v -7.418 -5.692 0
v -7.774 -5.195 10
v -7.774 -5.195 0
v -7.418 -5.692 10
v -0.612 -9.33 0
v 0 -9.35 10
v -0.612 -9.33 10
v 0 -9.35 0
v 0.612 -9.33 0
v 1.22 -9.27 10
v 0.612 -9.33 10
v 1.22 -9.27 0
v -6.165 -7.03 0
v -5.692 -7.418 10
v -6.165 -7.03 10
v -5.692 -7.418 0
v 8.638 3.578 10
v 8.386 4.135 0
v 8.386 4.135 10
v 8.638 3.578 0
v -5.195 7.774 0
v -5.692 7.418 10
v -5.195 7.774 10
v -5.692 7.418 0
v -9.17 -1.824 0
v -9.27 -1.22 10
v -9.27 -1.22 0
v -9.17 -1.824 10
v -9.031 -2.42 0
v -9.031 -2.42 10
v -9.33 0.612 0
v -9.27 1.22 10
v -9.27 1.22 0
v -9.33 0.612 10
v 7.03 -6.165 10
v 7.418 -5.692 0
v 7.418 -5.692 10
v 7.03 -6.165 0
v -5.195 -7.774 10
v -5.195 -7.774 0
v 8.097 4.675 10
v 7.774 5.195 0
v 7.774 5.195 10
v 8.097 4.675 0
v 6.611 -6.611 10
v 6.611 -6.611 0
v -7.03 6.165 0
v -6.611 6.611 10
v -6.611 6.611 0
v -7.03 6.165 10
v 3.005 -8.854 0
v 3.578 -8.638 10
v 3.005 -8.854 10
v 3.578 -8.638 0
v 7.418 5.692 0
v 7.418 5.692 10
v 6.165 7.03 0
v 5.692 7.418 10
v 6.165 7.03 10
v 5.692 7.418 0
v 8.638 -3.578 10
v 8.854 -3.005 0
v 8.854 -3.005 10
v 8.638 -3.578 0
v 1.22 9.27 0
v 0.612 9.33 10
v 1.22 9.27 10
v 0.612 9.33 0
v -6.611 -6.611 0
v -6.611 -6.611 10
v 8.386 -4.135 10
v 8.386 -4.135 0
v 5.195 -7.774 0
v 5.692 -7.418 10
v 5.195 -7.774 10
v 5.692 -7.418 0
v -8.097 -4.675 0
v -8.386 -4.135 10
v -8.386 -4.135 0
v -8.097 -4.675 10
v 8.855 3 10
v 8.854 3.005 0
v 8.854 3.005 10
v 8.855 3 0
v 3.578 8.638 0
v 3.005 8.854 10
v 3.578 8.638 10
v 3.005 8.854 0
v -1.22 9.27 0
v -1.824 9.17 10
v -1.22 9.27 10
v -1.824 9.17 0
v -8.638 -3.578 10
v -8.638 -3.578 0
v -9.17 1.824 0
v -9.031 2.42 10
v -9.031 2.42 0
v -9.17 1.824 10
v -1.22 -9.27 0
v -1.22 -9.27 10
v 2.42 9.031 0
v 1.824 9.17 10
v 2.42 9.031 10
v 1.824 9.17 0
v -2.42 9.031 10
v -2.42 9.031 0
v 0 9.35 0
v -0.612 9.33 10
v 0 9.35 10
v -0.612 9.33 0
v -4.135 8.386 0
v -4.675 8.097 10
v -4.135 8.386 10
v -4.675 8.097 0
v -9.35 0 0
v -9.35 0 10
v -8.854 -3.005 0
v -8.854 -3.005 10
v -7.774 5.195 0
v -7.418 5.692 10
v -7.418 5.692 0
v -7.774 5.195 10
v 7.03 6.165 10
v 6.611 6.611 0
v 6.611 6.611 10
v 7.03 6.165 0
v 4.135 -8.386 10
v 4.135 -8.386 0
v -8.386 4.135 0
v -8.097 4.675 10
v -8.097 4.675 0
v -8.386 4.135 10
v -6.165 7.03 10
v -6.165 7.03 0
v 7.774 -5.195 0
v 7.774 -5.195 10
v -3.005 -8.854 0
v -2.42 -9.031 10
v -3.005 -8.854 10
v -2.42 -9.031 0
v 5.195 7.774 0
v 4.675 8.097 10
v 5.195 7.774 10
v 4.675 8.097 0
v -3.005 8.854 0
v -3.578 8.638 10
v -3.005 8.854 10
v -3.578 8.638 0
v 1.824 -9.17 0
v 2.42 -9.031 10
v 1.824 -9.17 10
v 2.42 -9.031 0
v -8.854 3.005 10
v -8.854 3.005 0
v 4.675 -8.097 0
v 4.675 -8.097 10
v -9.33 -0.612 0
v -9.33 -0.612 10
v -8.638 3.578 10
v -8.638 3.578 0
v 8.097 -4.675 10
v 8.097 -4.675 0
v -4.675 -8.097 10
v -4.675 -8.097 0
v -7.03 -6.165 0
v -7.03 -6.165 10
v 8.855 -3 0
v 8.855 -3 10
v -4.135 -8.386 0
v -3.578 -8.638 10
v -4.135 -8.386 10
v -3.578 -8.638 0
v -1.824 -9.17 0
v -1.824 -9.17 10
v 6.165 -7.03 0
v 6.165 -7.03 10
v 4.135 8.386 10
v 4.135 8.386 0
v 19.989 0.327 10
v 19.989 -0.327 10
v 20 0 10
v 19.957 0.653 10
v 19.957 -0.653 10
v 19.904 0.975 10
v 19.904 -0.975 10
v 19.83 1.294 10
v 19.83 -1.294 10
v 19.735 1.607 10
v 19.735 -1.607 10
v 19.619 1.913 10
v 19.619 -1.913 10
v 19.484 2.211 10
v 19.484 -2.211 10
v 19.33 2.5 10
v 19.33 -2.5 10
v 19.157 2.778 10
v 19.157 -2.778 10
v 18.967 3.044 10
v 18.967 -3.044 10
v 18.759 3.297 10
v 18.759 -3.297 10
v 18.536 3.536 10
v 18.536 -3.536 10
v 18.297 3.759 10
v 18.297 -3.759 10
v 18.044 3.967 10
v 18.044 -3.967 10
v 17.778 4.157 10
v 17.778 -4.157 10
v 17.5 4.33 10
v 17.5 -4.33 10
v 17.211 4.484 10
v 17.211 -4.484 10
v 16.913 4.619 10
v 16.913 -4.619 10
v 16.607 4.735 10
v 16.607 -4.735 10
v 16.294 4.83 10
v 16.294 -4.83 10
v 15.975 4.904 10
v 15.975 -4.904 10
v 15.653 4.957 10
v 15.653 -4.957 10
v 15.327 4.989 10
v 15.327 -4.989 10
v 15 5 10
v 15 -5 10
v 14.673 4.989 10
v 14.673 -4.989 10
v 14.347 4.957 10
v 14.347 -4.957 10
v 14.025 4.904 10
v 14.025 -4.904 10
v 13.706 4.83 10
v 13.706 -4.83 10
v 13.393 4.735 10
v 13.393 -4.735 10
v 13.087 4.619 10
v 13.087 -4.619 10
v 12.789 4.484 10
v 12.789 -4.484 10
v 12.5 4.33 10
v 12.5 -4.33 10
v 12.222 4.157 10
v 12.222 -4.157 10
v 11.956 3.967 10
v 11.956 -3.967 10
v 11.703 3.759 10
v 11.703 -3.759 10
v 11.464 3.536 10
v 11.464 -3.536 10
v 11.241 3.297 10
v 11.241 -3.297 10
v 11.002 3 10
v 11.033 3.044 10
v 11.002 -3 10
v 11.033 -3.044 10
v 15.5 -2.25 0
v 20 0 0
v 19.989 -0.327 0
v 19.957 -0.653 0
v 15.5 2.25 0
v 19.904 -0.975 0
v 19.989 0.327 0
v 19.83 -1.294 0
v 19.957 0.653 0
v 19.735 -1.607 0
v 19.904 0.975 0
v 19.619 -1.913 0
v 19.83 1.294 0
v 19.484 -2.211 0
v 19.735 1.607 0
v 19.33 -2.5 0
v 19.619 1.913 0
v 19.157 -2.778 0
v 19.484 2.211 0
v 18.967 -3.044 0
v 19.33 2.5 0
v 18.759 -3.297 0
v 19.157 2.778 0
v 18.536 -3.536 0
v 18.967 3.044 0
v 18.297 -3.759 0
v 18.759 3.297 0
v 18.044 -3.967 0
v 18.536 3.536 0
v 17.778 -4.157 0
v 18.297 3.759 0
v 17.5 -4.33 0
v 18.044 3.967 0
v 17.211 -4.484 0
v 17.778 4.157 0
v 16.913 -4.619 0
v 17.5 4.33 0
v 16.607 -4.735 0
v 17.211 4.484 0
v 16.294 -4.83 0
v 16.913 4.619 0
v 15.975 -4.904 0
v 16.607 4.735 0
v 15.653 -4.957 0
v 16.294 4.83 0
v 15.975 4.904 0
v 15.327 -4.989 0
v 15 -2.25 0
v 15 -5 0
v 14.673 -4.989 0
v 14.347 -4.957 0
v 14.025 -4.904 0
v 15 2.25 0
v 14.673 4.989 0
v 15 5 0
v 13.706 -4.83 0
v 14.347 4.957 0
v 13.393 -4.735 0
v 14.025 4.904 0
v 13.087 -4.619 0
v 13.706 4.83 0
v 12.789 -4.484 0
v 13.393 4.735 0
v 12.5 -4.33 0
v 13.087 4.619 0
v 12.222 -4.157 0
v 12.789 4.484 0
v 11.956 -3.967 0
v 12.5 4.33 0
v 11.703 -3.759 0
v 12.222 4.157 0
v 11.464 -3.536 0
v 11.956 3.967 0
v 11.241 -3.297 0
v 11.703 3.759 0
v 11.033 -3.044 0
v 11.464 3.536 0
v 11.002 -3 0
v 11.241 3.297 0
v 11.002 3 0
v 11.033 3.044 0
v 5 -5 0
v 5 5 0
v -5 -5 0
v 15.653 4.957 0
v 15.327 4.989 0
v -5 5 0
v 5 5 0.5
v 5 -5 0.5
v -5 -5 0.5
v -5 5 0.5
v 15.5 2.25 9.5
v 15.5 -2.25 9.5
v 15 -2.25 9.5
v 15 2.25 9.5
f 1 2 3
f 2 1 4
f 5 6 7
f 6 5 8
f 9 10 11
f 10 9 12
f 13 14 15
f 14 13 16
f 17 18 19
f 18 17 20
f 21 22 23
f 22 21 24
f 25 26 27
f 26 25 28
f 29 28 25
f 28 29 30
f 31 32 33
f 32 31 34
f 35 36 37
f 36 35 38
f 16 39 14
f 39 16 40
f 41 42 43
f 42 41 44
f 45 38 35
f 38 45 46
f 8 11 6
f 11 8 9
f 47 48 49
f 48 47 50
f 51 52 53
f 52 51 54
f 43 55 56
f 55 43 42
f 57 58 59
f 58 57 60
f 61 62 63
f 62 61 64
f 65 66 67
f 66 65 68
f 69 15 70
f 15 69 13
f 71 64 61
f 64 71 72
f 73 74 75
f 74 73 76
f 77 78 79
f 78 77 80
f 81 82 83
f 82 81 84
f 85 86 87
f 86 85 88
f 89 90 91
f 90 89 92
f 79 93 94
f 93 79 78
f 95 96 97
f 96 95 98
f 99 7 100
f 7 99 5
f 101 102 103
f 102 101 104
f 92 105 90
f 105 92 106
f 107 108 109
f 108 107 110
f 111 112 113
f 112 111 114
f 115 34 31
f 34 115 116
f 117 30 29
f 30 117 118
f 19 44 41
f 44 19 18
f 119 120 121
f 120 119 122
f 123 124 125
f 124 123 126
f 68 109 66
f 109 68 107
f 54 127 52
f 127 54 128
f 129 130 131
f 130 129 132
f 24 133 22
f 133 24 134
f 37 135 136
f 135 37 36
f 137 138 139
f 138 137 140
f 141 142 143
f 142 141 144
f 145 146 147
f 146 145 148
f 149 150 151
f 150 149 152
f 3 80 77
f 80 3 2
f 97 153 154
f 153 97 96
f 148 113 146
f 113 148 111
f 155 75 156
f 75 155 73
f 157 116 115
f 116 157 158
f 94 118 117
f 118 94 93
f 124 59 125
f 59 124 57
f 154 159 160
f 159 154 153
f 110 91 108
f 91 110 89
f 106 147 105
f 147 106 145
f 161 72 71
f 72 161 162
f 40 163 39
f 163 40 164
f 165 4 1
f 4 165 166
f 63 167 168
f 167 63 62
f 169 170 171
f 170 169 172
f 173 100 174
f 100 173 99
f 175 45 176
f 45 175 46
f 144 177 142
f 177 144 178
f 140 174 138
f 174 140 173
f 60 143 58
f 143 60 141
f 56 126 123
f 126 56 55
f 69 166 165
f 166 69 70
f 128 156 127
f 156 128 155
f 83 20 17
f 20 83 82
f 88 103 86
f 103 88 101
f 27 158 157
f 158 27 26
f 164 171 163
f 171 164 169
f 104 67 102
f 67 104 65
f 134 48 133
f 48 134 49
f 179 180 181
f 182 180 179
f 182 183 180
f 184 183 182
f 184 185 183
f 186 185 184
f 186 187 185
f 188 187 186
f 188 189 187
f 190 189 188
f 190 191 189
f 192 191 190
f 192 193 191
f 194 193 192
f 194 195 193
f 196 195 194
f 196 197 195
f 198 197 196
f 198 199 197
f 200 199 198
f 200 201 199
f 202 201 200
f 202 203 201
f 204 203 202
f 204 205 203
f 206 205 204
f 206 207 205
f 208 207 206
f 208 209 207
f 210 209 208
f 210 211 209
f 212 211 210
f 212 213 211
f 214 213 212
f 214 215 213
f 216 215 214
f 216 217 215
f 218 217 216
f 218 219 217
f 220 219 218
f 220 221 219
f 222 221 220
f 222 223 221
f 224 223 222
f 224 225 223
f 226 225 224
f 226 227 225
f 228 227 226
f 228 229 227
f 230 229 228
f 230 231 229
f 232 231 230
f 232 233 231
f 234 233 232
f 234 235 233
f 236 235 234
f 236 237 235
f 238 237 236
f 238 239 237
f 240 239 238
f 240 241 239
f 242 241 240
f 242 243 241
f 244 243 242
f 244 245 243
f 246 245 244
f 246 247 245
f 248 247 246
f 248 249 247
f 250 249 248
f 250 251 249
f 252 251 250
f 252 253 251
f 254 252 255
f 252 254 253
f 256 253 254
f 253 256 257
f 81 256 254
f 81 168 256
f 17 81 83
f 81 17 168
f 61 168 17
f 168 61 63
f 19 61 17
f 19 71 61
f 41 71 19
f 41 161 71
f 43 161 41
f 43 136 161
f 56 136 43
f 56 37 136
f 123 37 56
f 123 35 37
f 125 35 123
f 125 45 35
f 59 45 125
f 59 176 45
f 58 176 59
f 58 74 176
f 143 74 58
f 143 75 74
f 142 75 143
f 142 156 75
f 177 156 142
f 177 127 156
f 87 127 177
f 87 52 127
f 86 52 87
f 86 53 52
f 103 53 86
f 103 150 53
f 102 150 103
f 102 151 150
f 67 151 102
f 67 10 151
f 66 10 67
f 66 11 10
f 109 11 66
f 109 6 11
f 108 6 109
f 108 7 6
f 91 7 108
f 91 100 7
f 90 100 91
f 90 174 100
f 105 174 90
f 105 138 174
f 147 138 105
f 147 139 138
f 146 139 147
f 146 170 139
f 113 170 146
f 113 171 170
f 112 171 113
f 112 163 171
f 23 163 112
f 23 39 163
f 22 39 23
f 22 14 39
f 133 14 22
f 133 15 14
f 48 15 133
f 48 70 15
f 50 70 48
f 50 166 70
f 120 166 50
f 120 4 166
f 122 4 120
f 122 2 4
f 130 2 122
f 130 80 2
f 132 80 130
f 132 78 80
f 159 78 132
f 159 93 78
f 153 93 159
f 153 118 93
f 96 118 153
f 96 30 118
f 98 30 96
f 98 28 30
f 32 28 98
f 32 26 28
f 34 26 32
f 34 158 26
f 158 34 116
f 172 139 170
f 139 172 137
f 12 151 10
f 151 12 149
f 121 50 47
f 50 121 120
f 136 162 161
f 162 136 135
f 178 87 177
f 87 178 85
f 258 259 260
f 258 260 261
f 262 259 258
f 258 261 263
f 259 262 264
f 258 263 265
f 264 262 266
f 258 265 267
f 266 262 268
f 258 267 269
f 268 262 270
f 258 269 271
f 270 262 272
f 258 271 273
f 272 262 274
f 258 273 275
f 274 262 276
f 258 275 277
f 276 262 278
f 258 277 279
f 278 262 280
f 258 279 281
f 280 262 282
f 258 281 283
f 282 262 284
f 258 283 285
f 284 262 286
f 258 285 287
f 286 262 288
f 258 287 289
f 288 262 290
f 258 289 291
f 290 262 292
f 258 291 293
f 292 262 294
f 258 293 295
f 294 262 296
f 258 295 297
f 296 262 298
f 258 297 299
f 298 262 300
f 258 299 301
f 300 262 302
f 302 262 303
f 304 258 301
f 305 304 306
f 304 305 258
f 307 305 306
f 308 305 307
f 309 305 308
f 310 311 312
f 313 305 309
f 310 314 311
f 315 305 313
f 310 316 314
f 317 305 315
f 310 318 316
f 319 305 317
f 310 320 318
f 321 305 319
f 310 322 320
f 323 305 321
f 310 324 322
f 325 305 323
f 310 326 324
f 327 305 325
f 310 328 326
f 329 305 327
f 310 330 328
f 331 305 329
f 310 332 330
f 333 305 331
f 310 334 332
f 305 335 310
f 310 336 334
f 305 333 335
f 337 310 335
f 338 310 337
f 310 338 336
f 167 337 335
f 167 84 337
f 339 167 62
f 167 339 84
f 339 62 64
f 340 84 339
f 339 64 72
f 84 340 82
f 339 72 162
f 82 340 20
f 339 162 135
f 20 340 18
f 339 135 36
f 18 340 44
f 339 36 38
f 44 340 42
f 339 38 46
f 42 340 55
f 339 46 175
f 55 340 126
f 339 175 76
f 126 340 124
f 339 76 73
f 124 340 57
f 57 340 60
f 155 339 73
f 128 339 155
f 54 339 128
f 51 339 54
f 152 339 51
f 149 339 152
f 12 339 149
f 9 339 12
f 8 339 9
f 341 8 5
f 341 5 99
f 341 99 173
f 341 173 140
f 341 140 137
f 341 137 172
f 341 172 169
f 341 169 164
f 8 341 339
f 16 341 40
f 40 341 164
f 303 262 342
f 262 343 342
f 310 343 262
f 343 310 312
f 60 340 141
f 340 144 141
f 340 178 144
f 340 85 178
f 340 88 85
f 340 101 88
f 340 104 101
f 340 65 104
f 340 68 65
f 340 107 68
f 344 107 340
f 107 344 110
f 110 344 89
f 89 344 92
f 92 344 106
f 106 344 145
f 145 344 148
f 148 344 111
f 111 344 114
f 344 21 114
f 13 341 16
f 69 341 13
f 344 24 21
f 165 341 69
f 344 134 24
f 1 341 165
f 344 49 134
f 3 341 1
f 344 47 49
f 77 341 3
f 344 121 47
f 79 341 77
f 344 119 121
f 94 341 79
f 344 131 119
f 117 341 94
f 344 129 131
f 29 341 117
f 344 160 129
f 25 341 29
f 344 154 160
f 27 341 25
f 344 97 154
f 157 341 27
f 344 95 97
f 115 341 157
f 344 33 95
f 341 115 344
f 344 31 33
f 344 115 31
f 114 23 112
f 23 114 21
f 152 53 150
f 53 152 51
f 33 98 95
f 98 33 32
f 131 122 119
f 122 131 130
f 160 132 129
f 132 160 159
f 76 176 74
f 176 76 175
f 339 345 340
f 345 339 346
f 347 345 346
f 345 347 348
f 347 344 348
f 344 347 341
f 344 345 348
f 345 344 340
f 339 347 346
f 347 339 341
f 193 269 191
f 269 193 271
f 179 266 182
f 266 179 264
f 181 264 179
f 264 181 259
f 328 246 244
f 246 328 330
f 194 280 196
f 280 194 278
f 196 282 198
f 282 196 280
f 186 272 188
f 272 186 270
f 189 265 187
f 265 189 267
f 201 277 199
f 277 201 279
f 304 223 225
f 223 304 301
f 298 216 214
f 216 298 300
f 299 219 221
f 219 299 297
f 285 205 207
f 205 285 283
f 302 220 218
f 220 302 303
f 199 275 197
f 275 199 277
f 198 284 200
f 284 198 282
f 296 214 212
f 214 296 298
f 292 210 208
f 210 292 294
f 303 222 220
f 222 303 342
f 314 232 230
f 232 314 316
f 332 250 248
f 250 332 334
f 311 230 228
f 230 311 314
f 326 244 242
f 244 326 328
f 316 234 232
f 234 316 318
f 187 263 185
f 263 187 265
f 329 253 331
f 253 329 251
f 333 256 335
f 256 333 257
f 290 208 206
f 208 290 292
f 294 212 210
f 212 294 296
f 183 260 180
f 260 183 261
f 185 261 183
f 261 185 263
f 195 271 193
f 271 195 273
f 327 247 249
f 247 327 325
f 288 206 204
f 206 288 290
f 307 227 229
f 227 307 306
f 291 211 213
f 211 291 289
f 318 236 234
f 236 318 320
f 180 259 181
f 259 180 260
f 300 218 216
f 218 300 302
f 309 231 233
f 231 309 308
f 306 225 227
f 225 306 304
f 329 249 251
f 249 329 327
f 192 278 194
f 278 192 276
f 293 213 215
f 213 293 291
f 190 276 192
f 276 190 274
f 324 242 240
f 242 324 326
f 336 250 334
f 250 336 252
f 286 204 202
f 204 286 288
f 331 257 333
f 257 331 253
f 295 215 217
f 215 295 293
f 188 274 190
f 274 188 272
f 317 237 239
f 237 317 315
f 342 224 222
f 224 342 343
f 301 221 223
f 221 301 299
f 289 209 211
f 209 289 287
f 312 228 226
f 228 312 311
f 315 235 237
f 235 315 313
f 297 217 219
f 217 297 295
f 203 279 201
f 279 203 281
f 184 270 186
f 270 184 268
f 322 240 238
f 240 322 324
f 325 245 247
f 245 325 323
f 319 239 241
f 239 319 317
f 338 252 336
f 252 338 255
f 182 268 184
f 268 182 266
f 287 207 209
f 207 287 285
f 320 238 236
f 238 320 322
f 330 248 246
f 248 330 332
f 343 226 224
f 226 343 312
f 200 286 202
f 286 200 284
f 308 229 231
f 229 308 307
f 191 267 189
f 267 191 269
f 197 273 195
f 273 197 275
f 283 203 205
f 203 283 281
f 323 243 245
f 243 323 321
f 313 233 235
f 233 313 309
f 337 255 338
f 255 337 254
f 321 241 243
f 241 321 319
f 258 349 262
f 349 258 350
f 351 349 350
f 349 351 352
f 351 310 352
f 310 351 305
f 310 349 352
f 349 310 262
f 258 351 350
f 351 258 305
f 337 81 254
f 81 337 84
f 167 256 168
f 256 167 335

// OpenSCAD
// Tubing clip for 12.7 mm stand rod
// Print orientation: flat on bed, extrusion along +Z

$fn = 96;

// --- Ring dimensions ---
rod_id   = 12.7;   // rod ring inner diameter
rod_wall = 3;      // rod ring wall thickness
tub_id   = 6;      // tubing ring inner diameter
tub_wall = 2;      // tubing ring wall thickness

// --- Opening dimensions ---
rod_open_w = 10;   // rod ring -X opening width (y = -5 to 5)
tub_open_w = 4.5;  // tubing ring +X opening width (y = -2.25 to 2.25)

// --- Bridge ---
bridge_w = 6;      // bridge width along Y
bridge_x0 = 8;     // bridge start (X)
bridge_x1 = 12;    // bridge end (X)

// --- Extrusion ---
height = 10;       // extrusion height (Z)

// --- Derived ---
rod_od = rod_id + 2 * rod_wall;
tub_od = tub_id + 2 * tub_wall;
eps = 0.5;         // cutter overshoot

union() {
    // Rod ring
    difference() {
        translate([0, 0, 0])
            cylinder(d = rod_od, h = height);
        translate([-rod_open_w / 2, -5, -eps])
            cube([rod_open_w, 10, 2 * eps]);
    }

    // Tubing ring
    difference() {
        translate([15, 0, 0])
            cylinder(d = tub_od, h = height);
        translate([15, -tub_open_w / 2, -eps])
            cube([eps, tub_open_w, height]);
    }

    // Solid bridge
    translate([bridge_x0, -bridge_w / 2, 0])
        cube([bridge_x1 - bridge_x0, bridge_w, height]);
}
